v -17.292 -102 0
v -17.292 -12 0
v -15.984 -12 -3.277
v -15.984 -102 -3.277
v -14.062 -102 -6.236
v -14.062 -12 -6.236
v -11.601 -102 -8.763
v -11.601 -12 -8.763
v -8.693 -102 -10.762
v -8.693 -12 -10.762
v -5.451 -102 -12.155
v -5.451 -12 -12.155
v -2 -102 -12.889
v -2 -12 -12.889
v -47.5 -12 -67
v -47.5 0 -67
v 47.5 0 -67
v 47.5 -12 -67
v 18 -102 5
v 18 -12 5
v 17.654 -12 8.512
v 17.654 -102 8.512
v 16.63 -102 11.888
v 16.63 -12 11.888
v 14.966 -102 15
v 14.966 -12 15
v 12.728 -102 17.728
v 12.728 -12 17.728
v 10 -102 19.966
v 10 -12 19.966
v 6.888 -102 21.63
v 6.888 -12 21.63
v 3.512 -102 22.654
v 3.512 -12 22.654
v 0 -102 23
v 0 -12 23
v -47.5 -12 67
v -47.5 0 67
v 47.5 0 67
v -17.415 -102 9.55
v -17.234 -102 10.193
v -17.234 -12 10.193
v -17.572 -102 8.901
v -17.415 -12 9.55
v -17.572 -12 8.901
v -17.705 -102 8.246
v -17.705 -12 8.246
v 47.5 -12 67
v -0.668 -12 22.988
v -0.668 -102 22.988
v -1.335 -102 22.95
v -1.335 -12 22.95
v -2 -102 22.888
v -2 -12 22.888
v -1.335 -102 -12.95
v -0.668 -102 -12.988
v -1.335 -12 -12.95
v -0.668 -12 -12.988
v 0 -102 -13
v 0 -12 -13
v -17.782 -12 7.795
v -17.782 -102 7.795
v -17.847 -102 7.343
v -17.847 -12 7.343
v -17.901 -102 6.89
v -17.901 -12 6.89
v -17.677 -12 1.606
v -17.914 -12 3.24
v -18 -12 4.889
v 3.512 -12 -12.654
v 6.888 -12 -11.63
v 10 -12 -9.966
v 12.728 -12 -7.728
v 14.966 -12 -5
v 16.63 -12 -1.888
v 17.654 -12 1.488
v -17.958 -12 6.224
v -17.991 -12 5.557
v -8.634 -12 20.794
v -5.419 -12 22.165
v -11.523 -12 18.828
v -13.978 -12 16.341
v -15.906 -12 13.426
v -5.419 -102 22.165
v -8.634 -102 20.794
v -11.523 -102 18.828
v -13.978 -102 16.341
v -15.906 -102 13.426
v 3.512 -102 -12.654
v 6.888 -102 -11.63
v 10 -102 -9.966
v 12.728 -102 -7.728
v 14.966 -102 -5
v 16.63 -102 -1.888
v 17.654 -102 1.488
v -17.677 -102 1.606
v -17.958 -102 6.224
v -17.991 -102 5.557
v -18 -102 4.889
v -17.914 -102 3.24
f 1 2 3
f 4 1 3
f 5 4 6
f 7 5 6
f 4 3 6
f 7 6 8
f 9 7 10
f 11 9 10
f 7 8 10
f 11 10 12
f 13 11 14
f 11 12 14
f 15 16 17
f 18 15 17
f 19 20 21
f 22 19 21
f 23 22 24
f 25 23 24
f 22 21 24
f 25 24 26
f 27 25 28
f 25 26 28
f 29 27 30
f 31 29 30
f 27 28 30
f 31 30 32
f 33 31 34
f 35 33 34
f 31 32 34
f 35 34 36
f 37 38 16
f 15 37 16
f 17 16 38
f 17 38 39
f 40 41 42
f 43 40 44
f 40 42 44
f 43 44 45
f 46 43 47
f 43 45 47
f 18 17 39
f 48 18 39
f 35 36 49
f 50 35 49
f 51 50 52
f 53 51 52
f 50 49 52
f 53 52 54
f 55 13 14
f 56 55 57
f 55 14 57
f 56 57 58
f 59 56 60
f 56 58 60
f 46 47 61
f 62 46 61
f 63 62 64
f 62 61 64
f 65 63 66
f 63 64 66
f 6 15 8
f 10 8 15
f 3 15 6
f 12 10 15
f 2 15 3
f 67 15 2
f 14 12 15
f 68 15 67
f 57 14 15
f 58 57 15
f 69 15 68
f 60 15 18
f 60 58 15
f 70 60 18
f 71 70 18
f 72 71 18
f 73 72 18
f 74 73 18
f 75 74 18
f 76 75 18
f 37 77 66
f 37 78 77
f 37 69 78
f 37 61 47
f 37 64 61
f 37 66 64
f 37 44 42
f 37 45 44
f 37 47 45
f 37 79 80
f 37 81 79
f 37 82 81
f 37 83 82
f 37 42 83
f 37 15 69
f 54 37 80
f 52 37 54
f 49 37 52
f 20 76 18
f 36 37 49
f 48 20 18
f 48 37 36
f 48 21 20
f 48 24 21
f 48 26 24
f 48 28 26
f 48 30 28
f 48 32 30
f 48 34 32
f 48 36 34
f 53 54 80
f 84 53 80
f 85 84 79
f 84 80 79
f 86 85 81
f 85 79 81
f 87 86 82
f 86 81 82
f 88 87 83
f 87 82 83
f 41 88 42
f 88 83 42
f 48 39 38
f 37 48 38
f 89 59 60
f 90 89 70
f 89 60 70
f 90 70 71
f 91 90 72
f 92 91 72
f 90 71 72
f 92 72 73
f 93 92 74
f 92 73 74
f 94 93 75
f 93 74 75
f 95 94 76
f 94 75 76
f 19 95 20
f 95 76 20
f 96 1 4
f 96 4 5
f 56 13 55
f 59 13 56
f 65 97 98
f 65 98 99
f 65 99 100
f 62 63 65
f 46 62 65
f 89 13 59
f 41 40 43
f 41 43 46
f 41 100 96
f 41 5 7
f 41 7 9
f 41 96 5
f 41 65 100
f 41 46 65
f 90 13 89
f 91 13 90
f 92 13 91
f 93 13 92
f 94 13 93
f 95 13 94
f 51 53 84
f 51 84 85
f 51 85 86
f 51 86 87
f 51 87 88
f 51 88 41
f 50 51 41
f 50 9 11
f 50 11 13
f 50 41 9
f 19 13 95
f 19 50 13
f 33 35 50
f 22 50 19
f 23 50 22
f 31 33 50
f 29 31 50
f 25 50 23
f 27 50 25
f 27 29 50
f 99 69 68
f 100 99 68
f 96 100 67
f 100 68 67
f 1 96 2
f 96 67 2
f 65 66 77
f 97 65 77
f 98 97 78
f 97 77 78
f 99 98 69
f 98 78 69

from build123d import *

# Parameters (mm, degrees)
F1_DEPTH = 12
F3_DEPTH = 90


with BuildPart() as f1:
    # F0 (on Front) → F1 (new body)
    with BuildSketch(Plane.XZ):
        Polygon((47.5, -67), (47.5, 0), (47.5, 67), (0, 67), (-47.5, 67), (-47.5, -67), align=None)
    extrude(amount=F1_DEPTH)

    # F2 (on face) → F3 (join)
    with BuildSketch(Plane.XZ.offset(12)):
        with BuildLine():
            Line((0, 5), (0, 0))
            Line((0, 0), (-4.8013158464, 0))
            ThreePointArc((-4.8013158464, 0), (-1.2386876382, -6.0708472044), (0, -13))
            ThreePointArc((0, -13), (12.7279220614, -7.7279220614), (18, 5))
            ThreePointArc((18, 5), (12.7279220614, 17.7279220614), (0, 23))
            Line((0, 23), (0, 5))
        make_face()
        with BuildLine():
            Line((-4.8013158464, 0), (0, 0))
            Line((0, 0), (0, 5))
            Line((0, 5), (0, 23))
            ThreePointArc((0, 23), (-5.397234005, 11.476680806), (-17.7049180328, 8.2459016393))
            ThreePointArc((-17.7049180328, 8.2459016393), (-17.8156486606, 7.5695647107), (-17.9005524862, 6.8895027624))
            ThreePointArc((-17.9005524862, 6.8895027624), (-10.6901851858, 4.7010550004), (-4.8013158464, 0))
        make_face()
        with BuildLine():
            ThreePointArc((0, -13), (-1.2386876382, -6.0708472044), (-4.8013158464, 0))
            Line((-4.8013158464, 0), (-7.550100402, 0))
            ThreePointArc((-7.550100402, 0), (-3.4675400893, -5.881167982), (-2.0003453113, -12.8885052096))
            ThreePointArc((-2.0003453113, -12.8885052096), (-1.0017250687, -12.9721046872), (0, -13))
        make_face()
        with BuildLine():
            Line((-7.550100402, 0), (-4.8013158464, 0))
            ThreePointArc((-4.8013158464, 0), (-10.6901851858, 4.7010550004), (-17.9005524862, 6.8895027624))
            ThreePointArc((-17.9005524862, 6.8895027624), (-17.9779647514, 5.8903838491), (-17.9996546887, 4.8885052096))
            ThreePointArc((-17.9996546887, 4.8885052096), (-12.3726305137, 3.3040864423), (-7.550100402, 0))
        make_face()
        with BuildLine():
            ThreePointArc((-2.0003453113, -12.8885052096), (-3.4675400893, -5.881167982), (-7.550100402, 0))
            Line((-7.550100402, 0), (-17.2916164658, 0))
            ThreePointArc((-17.2916164658, 0), (-11.6005749399, -8.76323585), (-2.0003453113, -12.8885052096))
        make_face()
        with BuildLine():
            Line((-17.2916164658, 0), (-7.550100402, 0))
            ThreePointArc((-7.550100402, 0), (-12.3726305137, 3.3040864423), (-17.9996546887, 4.8885052096))
            ThreePointArc((-17.9996546887, 4.8885052096), (-17.8141187186, 2.4198499502), (-17.2916164658, 0))
        make_face()
        with BuildLine():
            ThreePointArc((-17.7049180328, 8.2459016393), (-5.397234005, 11.476680806), (0, 23))
            ThreePointArc((0, 23), (-1.0017918512, 22.9721009647), (-2.0004782551, 22.888490343))
            ThreePointArc((-2.0004782551, 22.888490343), (-6.6776028044, 13.0131233652), (-17.2344944225, 10.1934768701))
            ThreePointArc((-17.2344944225, 10.1934768701), (-17.4968253692, 9.2262396998), (-17.7049180328, 8.2459016393))
        make_face()
        with BuildLine():
            ThreePointArc((-17.2344944225, 10.1934768701), (-6.6776028044, 13.0131233652), (-2.0004782551, 22.888490343))
            ThreePointArc((-2.0004782551, 22.888490343), (-11.523319194, 18.8279830328), (-17.2344944225, 10.1934768701))
        make_face()
    extrude(amount=F3_DEPTH)


solid = f1.part
